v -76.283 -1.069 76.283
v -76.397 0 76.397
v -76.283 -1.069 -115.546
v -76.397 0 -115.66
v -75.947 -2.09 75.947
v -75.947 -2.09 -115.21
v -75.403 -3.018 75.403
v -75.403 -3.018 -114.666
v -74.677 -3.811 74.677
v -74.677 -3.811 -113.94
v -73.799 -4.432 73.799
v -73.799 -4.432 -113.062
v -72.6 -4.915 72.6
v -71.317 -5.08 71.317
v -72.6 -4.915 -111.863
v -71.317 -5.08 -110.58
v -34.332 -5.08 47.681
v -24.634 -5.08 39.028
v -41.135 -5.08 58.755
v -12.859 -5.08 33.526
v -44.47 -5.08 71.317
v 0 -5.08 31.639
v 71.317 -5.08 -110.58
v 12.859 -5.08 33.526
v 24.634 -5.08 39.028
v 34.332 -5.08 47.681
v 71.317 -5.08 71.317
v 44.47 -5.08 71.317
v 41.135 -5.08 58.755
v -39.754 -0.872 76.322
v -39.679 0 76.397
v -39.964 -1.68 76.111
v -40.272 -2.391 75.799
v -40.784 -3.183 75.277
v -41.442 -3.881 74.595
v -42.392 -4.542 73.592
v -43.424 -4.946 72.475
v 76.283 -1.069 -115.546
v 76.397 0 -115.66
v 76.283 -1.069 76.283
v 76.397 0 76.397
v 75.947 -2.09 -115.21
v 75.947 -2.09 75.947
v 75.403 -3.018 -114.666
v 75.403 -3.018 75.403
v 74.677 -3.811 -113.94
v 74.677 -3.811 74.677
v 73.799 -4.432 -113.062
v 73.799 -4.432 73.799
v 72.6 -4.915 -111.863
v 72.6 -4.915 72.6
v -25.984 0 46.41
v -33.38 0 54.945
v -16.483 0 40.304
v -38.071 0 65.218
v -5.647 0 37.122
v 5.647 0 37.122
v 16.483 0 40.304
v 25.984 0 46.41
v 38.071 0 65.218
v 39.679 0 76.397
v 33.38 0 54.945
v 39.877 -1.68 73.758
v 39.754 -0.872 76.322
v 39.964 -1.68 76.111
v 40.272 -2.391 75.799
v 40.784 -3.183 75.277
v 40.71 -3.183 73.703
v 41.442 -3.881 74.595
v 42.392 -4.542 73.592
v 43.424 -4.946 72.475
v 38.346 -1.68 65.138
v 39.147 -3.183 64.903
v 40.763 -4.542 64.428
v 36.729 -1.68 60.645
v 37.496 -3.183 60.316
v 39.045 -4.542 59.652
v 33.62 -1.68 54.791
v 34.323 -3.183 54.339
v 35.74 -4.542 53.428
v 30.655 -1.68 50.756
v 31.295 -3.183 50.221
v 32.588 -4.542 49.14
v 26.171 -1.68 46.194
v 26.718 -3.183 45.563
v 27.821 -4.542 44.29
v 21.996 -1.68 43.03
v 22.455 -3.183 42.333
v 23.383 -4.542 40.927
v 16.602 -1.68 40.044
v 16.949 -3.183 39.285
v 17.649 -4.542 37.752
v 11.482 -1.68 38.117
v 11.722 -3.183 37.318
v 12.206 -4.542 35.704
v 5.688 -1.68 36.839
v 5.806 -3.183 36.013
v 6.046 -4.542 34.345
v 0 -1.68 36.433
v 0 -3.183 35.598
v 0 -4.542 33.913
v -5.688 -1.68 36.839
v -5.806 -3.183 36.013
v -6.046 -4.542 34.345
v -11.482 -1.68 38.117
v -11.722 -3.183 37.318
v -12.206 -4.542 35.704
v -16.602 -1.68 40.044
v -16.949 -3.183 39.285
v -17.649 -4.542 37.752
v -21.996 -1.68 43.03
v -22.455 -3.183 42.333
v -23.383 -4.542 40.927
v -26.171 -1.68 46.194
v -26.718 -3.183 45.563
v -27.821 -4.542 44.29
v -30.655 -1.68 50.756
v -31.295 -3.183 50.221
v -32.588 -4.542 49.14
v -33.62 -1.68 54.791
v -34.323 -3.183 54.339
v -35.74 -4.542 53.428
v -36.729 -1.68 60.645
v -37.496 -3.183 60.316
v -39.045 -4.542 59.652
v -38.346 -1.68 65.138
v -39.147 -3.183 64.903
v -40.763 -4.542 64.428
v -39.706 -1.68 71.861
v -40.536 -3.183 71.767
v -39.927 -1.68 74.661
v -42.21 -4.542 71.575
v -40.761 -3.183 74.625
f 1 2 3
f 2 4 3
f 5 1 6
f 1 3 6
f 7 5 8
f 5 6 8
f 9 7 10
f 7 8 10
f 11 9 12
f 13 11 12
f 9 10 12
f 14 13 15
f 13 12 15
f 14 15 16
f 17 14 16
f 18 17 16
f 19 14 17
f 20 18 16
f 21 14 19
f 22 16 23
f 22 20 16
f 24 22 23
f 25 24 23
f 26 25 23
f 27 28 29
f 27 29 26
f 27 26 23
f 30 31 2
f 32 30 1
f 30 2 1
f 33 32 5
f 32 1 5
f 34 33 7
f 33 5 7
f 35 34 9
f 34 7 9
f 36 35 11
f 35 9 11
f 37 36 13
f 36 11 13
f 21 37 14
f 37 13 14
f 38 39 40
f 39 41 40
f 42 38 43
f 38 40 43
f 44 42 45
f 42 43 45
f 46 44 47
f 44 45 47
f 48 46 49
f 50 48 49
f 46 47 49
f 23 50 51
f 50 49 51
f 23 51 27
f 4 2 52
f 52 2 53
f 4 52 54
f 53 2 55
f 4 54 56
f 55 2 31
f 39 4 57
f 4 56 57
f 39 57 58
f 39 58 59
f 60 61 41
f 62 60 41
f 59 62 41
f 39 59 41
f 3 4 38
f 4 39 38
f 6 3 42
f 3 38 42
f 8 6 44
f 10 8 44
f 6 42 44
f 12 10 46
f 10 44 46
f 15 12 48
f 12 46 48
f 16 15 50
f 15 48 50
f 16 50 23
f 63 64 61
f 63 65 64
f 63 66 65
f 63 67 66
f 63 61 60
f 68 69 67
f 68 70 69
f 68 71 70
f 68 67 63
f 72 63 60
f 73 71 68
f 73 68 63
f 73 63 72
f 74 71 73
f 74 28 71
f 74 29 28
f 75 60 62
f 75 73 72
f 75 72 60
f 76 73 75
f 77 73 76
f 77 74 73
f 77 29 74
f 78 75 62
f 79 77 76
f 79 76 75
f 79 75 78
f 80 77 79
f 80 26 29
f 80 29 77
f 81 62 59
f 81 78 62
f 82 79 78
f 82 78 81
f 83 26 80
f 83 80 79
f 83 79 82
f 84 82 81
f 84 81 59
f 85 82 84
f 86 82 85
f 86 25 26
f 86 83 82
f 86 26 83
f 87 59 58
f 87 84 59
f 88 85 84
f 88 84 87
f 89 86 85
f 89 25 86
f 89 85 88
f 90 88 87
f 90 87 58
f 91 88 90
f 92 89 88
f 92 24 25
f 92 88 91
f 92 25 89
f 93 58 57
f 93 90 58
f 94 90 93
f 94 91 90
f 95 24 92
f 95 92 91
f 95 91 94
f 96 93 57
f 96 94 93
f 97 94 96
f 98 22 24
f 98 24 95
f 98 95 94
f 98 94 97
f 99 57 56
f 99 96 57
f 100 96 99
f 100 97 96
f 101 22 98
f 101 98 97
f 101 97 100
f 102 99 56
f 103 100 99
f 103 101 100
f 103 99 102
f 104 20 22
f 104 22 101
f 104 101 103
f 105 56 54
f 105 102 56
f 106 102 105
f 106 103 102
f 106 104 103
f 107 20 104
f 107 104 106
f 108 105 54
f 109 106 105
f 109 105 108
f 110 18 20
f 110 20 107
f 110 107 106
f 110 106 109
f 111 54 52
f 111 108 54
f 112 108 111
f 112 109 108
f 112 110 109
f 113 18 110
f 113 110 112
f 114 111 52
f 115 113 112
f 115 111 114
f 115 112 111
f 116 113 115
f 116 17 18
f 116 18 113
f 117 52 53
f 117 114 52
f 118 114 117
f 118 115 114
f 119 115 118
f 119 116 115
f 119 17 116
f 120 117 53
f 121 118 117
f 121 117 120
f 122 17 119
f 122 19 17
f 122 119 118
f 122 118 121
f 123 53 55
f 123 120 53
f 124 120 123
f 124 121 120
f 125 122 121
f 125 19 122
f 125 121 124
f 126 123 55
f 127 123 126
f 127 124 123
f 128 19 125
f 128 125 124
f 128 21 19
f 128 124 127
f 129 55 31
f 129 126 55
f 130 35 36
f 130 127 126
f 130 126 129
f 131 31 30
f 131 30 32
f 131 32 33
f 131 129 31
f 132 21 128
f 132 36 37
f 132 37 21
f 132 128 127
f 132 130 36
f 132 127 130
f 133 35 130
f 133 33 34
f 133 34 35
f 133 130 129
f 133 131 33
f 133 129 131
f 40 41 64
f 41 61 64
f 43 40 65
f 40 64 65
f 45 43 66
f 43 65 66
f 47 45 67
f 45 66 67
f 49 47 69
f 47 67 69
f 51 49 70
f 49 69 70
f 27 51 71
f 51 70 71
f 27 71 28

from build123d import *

# Parameters (mm, degrees)
F1_DEPTH = 5.08
F2_R     = 5.07999


# Not quite as in the source:
# - a fillet or chamfer is up to 0.001 mm smaller than in the source, because OpenCascade refuses the exact size


with BuildPart() as f1:
    # F0 (on Front) → F1 (new body)
    with BuildSketch(Plane.XZ):
        with BuildLine():
            Line((76.3972327113, 76.3972327113), (39.6787461365, 76.3972327113))
            ThreePointArc((39.6787461365, 76.3972327113), (3.7253e-06, 36.7184903001), (-39.678738686, 76.3972327113))
            Line((-39.678738686, 76.3972327113), (-76.3972252607, 76.3972327113))
            Line((-76.3972252607, 76.3972327113), (-76.3972252607, -115.6601980329))
            Line((-76.3972252607, -115.6601980329), (76.3972327113, -115.6601980329))
            Line((76.3972327113, -115.6601980329), (76.3972327113, 76.3972327113))
        make_face()
    extrude(amount=F1_DEPTH)

    # F2 (radius 5.08 in the source; OpenCascade refuses exactly that, so slightly less here)
    f2_edges = [f1.edges().sort_by_distance(p)[0] for p in [
        (-58.037982, -5.08, 76.397233),
        (-76.397225, -5.08, -19.631483),
        (4e-06, -5.08, 36.71849),
        (58.037989, -5.08, 76.397233),
        (76.397233, -5.08, -19.631483),
        (4e-06, -5.08, -115.660198),
    ]]
    fillet(f2_edges, radius=F2_R)


solid = f1.part
